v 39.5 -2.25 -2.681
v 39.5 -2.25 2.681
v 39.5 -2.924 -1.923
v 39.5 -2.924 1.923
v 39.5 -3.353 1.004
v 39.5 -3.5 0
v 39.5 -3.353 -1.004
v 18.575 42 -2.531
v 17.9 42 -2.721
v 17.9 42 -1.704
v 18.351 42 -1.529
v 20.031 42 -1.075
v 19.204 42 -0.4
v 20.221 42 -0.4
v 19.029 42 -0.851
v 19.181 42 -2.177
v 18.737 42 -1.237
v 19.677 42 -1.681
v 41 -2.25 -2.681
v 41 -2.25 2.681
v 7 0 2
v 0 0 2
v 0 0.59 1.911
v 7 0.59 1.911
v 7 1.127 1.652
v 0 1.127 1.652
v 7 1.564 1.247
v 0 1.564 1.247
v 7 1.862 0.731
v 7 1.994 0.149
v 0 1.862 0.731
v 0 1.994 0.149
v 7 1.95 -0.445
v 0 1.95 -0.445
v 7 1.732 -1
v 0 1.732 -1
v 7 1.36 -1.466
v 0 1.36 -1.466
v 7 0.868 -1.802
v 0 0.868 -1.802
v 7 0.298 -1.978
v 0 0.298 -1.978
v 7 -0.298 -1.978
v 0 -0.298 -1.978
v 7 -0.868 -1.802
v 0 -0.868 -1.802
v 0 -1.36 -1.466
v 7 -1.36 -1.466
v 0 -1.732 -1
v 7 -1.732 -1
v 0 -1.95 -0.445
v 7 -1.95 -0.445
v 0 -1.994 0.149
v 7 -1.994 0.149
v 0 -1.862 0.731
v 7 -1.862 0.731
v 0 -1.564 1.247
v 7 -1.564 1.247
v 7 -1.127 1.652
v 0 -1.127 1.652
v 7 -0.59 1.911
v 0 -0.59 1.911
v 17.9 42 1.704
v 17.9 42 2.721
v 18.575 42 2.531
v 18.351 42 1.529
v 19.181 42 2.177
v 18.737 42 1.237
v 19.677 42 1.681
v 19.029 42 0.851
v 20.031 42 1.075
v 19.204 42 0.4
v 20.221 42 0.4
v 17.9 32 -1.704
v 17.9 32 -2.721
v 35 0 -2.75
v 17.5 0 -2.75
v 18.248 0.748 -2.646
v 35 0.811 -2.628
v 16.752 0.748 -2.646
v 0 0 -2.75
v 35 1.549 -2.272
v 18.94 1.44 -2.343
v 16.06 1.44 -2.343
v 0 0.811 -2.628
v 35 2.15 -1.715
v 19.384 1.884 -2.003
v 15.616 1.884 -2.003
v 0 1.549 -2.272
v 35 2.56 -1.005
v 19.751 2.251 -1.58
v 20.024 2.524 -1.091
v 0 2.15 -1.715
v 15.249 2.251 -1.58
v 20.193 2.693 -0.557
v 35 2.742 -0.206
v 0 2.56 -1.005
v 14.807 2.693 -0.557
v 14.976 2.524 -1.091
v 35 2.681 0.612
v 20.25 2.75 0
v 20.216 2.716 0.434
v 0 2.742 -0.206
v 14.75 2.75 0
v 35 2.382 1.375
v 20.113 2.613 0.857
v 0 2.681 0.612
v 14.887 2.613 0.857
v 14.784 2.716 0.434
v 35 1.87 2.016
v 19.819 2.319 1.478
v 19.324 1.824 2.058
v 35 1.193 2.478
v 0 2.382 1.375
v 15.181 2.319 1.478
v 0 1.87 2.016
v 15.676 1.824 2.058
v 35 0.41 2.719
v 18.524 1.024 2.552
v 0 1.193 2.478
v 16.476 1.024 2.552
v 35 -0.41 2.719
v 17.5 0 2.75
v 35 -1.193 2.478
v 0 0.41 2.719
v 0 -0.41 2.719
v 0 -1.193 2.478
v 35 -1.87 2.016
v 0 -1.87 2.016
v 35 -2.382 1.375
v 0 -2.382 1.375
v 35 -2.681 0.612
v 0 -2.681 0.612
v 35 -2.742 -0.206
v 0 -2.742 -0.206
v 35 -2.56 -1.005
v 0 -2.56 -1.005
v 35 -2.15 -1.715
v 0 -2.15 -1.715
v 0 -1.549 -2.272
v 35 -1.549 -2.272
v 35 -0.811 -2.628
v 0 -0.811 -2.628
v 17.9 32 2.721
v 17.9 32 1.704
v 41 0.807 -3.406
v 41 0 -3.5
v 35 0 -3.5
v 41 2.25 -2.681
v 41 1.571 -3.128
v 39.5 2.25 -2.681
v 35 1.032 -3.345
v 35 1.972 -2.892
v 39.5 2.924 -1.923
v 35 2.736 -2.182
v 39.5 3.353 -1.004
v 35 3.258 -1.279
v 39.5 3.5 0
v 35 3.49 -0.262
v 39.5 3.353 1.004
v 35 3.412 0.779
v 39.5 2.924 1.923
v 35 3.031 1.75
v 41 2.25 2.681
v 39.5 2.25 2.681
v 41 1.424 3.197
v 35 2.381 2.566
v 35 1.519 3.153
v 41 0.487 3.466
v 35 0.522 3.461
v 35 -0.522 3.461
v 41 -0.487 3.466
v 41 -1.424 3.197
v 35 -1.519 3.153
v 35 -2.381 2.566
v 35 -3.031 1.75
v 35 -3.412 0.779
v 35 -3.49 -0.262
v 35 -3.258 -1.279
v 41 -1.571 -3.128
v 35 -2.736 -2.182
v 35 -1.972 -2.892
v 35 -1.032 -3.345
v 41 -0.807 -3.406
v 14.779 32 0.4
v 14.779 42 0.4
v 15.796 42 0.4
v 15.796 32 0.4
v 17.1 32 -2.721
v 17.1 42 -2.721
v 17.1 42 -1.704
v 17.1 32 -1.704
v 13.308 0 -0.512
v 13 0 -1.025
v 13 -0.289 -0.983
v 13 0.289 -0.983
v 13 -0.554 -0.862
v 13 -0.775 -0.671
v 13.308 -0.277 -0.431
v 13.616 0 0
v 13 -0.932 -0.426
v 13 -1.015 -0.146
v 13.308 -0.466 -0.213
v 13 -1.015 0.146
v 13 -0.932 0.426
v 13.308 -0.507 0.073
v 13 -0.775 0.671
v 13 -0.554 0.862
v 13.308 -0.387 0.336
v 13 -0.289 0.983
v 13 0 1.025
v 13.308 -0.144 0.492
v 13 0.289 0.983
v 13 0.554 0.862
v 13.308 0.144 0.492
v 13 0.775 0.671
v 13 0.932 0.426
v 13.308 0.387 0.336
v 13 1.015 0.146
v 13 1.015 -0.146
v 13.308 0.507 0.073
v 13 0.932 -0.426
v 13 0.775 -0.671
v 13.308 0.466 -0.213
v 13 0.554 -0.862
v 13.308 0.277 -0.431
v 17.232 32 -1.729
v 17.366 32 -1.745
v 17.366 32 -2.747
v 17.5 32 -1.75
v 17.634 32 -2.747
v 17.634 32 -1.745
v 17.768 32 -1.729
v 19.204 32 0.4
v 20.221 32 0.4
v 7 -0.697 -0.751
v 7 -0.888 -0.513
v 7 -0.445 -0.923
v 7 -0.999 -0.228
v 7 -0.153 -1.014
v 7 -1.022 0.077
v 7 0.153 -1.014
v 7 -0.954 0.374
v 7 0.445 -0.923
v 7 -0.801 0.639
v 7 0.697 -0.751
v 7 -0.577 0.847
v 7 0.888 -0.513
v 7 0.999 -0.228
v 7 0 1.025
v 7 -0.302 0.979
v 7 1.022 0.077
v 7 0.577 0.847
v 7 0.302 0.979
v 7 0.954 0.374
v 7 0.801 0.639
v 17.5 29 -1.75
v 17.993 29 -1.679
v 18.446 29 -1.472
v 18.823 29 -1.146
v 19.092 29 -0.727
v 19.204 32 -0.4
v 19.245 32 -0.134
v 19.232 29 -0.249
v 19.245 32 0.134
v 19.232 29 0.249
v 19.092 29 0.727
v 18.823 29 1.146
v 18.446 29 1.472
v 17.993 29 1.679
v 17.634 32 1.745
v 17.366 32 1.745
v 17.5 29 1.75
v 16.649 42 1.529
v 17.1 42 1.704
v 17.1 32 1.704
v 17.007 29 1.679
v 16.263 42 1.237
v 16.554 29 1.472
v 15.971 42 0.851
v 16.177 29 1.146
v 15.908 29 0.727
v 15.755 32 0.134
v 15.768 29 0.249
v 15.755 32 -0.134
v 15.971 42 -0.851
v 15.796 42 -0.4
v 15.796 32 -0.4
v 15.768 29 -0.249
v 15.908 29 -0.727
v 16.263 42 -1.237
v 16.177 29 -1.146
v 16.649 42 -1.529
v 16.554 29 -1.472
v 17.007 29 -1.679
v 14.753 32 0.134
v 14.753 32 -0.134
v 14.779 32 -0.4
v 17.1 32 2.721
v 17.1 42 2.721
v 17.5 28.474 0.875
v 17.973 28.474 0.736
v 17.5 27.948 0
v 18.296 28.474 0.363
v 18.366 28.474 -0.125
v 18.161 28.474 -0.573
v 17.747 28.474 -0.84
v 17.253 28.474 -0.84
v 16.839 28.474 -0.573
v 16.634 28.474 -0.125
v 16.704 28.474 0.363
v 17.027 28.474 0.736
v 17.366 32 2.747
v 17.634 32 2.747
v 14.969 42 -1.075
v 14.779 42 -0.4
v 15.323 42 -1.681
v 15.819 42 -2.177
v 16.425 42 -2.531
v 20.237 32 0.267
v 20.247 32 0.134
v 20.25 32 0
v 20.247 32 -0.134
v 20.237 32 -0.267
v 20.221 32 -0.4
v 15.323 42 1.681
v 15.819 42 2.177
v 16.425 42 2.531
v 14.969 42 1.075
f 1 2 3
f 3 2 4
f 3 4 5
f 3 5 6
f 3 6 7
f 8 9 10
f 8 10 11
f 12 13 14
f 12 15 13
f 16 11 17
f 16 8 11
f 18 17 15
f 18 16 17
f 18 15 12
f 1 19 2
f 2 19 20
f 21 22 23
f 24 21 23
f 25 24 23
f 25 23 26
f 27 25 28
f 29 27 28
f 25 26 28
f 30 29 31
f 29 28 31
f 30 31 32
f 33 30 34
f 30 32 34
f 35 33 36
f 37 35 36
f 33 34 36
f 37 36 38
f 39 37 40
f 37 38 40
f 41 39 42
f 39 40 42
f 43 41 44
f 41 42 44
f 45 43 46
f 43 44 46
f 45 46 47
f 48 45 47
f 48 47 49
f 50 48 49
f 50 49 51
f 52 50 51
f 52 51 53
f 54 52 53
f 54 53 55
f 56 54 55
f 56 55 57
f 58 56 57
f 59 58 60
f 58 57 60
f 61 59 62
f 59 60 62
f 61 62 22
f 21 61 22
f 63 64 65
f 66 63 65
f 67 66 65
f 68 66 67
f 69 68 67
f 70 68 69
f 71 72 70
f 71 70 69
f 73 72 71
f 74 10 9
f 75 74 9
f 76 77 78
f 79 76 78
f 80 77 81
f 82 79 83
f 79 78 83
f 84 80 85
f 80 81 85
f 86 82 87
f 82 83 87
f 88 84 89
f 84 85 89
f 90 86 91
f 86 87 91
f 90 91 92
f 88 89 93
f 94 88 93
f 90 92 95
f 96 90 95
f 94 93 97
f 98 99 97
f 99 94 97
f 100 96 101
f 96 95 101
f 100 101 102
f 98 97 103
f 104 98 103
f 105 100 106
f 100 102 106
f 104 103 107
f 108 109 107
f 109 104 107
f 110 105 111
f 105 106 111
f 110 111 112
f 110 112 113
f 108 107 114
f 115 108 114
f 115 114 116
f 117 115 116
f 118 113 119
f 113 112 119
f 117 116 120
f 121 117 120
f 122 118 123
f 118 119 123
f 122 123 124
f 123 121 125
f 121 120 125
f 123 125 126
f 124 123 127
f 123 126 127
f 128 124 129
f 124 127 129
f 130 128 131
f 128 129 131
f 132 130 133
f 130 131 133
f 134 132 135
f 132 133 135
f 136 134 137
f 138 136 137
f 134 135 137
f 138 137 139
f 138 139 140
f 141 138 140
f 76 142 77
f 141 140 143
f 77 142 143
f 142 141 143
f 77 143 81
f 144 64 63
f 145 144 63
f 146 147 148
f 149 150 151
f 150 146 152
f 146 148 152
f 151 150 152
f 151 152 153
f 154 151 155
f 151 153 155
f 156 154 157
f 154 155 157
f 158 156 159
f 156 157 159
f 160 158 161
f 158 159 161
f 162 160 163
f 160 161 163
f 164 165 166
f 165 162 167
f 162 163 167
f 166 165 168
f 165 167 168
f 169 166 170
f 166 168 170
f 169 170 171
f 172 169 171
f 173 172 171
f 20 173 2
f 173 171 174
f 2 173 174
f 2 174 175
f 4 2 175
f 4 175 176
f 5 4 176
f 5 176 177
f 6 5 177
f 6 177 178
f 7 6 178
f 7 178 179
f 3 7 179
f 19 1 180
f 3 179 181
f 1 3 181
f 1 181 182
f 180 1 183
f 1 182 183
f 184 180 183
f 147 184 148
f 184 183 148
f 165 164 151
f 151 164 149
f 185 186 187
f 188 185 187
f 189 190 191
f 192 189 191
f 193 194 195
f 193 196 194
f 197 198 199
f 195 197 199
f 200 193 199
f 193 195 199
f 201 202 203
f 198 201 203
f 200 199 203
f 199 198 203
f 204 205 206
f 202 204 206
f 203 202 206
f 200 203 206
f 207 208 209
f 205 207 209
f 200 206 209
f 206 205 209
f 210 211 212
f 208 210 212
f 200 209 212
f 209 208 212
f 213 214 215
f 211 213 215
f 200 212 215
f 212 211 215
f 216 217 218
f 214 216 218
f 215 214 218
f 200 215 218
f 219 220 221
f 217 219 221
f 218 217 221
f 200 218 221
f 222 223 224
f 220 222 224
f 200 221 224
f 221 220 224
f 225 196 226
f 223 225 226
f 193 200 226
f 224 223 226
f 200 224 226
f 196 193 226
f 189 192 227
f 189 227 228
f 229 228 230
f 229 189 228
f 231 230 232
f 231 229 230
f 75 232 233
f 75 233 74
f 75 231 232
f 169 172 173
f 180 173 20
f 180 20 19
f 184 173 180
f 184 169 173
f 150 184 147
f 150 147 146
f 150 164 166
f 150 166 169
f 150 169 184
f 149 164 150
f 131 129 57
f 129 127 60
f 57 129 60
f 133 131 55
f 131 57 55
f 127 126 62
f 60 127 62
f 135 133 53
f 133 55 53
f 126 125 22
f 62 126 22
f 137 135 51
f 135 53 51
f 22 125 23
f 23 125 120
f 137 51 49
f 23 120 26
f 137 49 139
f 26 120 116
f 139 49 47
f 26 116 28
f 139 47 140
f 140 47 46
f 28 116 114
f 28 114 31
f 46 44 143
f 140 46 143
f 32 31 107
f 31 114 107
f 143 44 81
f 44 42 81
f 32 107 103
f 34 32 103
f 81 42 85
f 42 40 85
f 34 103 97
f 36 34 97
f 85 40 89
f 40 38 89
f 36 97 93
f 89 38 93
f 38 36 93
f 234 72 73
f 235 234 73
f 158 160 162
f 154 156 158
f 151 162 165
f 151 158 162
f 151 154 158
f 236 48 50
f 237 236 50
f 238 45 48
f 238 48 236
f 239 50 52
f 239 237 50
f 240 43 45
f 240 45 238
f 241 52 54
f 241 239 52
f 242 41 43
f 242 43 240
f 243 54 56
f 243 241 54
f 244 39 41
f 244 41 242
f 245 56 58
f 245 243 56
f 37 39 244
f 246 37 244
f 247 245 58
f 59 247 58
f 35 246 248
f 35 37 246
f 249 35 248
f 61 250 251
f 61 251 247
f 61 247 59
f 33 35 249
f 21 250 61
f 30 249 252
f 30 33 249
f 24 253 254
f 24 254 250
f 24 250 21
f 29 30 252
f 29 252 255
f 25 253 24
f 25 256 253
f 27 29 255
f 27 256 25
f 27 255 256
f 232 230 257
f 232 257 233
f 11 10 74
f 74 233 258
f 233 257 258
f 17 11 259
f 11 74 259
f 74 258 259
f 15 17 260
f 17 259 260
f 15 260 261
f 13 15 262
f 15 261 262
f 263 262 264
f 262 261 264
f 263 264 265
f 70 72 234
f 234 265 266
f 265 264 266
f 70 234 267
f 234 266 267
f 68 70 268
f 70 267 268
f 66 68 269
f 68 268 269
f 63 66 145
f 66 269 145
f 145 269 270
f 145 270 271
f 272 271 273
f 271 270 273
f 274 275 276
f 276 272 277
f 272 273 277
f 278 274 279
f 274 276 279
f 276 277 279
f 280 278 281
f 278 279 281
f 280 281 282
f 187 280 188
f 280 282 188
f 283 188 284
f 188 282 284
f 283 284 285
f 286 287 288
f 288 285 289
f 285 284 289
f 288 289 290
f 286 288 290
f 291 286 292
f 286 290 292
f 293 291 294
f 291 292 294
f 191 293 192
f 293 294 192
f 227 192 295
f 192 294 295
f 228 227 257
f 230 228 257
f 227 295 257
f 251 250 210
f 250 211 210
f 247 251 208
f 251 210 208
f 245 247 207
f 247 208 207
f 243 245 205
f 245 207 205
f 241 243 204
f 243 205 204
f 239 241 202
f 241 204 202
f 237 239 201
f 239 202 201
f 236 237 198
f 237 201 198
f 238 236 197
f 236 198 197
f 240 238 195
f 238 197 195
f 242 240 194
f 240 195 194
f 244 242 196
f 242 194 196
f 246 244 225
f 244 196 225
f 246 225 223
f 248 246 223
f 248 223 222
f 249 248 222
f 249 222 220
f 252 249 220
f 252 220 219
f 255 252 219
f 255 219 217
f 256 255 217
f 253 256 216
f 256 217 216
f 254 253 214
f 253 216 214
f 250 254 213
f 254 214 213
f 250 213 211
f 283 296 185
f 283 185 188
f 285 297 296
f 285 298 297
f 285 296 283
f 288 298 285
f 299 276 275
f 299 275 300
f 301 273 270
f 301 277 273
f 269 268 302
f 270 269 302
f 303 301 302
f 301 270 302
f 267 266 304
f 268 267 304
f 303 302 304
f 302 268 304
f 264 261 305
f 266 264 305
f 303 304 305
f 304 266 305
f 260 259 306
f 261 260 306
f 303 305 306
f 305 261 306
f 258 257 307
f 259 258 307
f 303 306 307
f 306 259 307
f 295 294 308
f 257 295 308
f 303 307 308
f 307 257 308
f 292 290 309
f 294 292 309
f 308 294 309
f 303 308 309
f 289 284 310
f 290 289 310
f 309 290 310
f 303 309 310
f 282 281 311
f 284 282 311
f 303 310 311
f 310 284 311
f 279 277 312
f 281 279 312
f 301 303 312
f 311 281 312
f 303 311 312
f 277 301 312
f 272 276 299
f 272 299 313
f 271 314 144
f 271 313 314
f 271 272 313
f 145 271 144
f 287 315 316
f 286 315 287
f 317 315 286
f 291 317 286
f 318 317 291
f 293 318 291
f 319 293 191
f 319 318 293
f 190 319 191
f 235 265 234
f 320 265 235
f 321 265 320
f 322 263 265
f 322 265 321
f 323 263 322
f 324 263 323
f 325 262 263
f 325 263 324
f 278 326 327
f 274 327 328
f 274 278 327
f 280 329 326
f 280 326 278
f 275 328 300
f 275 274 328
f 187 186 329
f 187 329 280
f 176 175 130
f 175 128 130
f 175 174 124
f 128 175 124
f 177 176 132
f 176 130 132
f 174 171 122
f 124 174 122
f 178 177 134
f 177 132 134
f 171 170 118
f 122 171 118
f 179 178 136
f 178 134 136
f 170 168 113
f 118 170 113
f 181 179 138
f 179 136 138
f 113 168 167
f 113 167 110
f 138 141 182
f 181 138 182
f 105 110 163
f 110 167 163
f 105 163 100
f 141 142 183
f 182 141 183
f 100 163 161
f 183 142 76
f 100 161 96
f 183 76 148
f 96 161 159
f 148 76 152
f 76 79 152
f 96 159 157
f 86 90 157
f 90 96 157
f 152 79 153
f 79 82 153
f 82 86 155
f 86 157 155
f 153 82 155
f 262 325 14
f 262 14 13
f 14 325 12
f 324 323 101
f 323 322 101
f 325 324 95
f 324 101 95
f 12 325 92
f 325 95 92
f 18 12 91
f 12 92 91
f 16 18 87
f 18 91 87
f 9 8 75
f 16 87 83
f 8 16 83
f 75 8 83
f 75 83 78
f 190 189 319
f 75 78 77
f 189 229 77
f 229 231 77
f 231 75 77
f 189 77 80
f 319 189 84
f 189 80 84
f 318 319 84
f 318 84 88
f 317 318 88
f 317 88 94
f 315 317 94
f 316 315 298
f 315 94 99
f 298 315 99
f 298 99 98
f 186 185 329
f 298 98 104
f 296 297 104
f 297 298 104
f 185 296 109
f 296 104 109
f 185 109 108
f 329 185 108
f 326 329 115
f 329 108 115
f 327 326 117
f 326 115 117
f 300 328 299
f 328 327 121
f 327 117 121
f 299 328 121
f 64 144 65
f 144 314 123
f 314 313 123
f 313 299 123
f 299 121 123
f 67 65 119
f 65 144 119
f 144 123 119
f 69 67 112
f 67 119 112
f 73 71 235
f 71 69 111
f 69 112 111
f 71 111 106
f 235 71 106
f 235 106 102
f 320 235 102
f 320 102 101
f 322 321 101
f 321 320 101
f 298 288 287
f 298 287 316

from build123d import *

# Parameters (mm, degrees)
SKETCH_1_R                  = 2.75
EXTRUDE_1_DEPTH             = 35
SKETCH_2_R                  = 2.75
EXTRUDE_2_DEPTH             = 42
HOLE_WIZARD_3_5_3_5_1_D     = 3.5
HOLE_WIZARD_3_5_3_5_1_DEPTH = 13
HOLE_WIZARD_3_5_3_5_1_TIP   = 1.051506083
SKETCH_4_W                  = 0.8
SKETCH_4_H                  = 0.8
CUT_EXTRUDE_1_DEPTH         = 10
SKETCH_5_R                  = 3.5
EXTRUDE_3_DEPTH             = 6
CUT_EXTRUDE_2_DEPTH         = 1.5
SKETCH_7_R                  = 2
CUT_EXTRUDE_3_DEPTH         = 7
M2_5X0_451_D                = 2.05
M2_5X0_451_DEPTH            = 6
M2_5X0_451_TIP              = 0.615882135


with BuildPart() as part:
    # Эскиз1 → Бобышка-Вытянуть1 (new body)
    with BuildSketch(Plane(origin=(0, 0, 0), x_dir=(0, 0, -1), z_dir=(1, 0, 0))):
        Circle(SKETCH_1_R)
    extrude(amount=EXTRUDE_1_DEPTH)

    # Эскиз2 → Бобышка-Вытянуть2 (add)
    with BuildSketch(Plane(origin=(0, 0, 0), x_dir=(1, 0, 0), z_dir=(0, 1, 0))):
        with Locations((17.5, 0)):
            Circle(SKETCH_2_R)
    extrude(amount=EXTRUDE_2_DEPTH)

    # Диаметр отверстия Ø3.5 (3.5)1
    with Locations(Plane(origin=(17.5, 42, 0), x_dir=(0, 0, 1), z_dir=(0, 1, 0))):
        with Locations((0, 0)):
            Hole(HOLE_WIZARD_3_5_3_5_1_D / 2, depth=HOLE_WIZARD_3_5_3_5_1_DEPTH)
            with Locations((0, 0, -(HOLE_WIZARD_3_5_3_5_1_DEPTH + HOLE_WIZARD_3_5_3_5_1_TIP / 2))):  # 118° drill point
                Cone(0, HOLE_WIZARD_3_5_3_5_1_D / 2, HOLE_WIZARD_3_5_3_5_1_TIP, mode=Mode.SUBTRACT)

    # Эскиз4 → Вырез-Вытянуть1 (cut)
    with BuildSketch(Plane(origin=(0, 42, 0), x_dir=(1, 0, 0), z_dir=(0, 1, 0))):
        with BuildLine():
            Line((17.1, 4), (17.1, 2.720753572))
            ThreePointArc((17.1, 2.720753572), (17.5, 2.75), (17.9, 2.720753572))
            Line((17.9, 2.720753572), (17.9, 4))
            Line((17.9, 4), (17.1, 4))
        make_face()
        with BuildLine():
            Line((17.1, -1.703672504), (17.1, -2.720753572))
            ThreePointArc((17.1, -2.720753572), (17.5, -2.75), (17.9, -2.720753572))
            Line((17.9, -2.720753572), (17.9, -1.703672504))
            ThreePointArc((17.9, -1.703672504), (17.5, -1.75), (17.1, -1.703672504))
        make_face()
        with BuildLine():
            ThreePointArc((17.9, 2.720753572), (17.5, 2.75), (17.1, 2.720753572))
            Line((17.1, 2.720753572), (17.1, 1.703672504))
            ThreePointArc((17.1, 1.703672504), (17.5, 1.75), (17.9, 1.703672504))
            Line((17.9, 1.703672504), (17.9, 2.720753572))
        make_face()
        with BuildLine():
            Line((17.1, 1.703672504), (17.1, 0.4))
            Line((17.1, 0.4), (17.9, 0.4))
            Line((17.9, 0.4), (17.9, 1.703672504))
            ThreePointArc((17.9, 1.703672504), (17.5, 1.75), (17.1, 1.703672504))
        make_face()
        with Locations((17.5, 0)):
            Rectangle(SKETCH_4_W, SKETCH_4_H)
        with BuildLine():
            Line((15.796327496, -0.4), (17.1, -0.4))
            Line((17.1, -0.4), (17.1, 0.4))
            Line((17.1, 0.4), (15.796327496, 0.4))
            ThreePointArc((15.796327496, 0.4), (15.75, 0), (15.796327496, -0.4))
        make_face()
        with BuildLine():
            ThreePointArc((14.779246428, 0.4), (14.75, 0), (14.779246428, -0.4))
            Line((14.779246428, -0.4), (15.796327496, -0.4))
            ThreePointArc((15.796327496, -0.4), (15.75, 0), (15.796327496, 0.4))
            Line((15.796327496, 0.4), (14.779246428, 0.4))
        make_face()
        with BuildLine():
            Line((19.203672504, -0.4), (20.220753572, -0.4))
            ThreePointArc((20.220753572, -0.4), (20.242678647, -0.200533883), (20.25, 0))
            ThreePointArc((20.25, 0), (20.242678647, 0.200533883), (20.220753572, 0.4))
            Line((20.220753572, 0.4), (19.203672504, 0.4))
            ThreePointArc((19.203672504, 0.4), (19.238379545, 0.20133693), (19.25, 0))
            ThreePointArc((19.25, 0), (19.238379545, -0.20133693), (19.203672504, -0.4))
        make_face()
        with BuildLine():
            Line((13.5, -0.4), (14.779246428, -0.4))
            ThreePointArc((14.779246428, -0.4), (14.75, 0), (14.779246428, 0.4))
            Line((14.779246428, 0.4), (13.5, 0.4))
            Line((13.5, 0.4), (13.5, -0.4))
        make_face()
        with BuildLine():
            Line((17.1, -0.4), (17.1, -1.703672504))
            ThreePointArc((17.1, -1.703672504), (17.5, -1.75), (17.9, -1.703672504))
            Line((17.9, -1.703672504), (17.9, -0.4))
            Line((17.9, -0.4), (17.1, -0.4))
        make_face()
        with BuildLine():
            Line((17.1, -2.720753572), (17.1, -4))
            Line((17.1, -4), (17.9, -4))
            Line((17.9, -4), (17.9, -2.720753572))
            ThreePointArc((17.9, -2.720753572), (17.5, -2.75), (17.1, -2.720753572))
        make_face()
        with BuildLine():
            Line((17.9, 0.4), (17.9, -0.4))
            Line((17.9, -0.4), (19.203672504, -0.4))
            ThreePointArc((19.203672504, -0.4), (19.238379545, -0.20133693), (19.25, 0))
            ThreePointArc((19.25, 0), (19.238379545, 0.20133693), (19.203672504, 0.4))
            Line((19.203672504, 0.4), (17.9, 0.4))
        make_face()
        with BuildLine():
            ThreePointArc((20.25, 0), (20.242678647, -0.200533883), (20.220753572, -0.4))
            Line((20.220753572, -0.4), (21.5, -0.4))
            Line((21.5, -0.4), (21.5, 0.4))
            Line((21.5, 0.4), (20.220753572, 0.4))
            ThreePointArc((20.220753572, 0.4), (20.242678647, 0.200533883), (20.25, 0))
        make_face()
    extrude(amount=-CUT_EXTRUDE_1_DEPTH, mode=Mode.SUBTRACT)

    # Эскиз5 → Бобышка-Вытянуть3 (add)
    with BuildSketch(Plane(origin=(35, 0, 0), x_dir=(0, 0, -1), z_dir=(1, 0, 0))):
        Circle(SKETCH_5_R)
    extrude(amount=EXTRUDE_3_DEPTH)

    # Эскиз6 → Вырез-Вытянуть2 (cut)
    with BuildSketch(Plane(origin=(41, 0, 0), x_dir=(0, 0, -1), z_dir=(1, 0, 0))):
        with BuildLine():
            ThreePointArc((2.680951324, 2.25), (0, 3.5), (-2.680951324, 2.25))
            Line((-2.680951324, 2.25), (2.680951324, 2.25))
        make_face()
        with BuildLine():
            Line((2.680951324, -2.25), (-2.680951324, -2.25))
            ThreePointArc((-2.680951324, -2.25), (0, -3.5), (2.680951324, -2.25))
        make_face()
    extrude(amount=-CUT_EXTRUDE_2_DEPTH, mode=Mode.SUBTRACT)

    # Эскиз7 → Вырез-Вытянуть3 (cut)
    with BuildSketch(Plane.ZY):
        Circle(SKETCH_7_R)
    extrude(amount=-CUT_EXTRUDE_3_DEPTH, mode=Mode.SUBTRACT)

    # Отверстие обработанное метчиком M2.5x0.451
    with Locations(Plane(origin=(7, 0, 0), x_dir=(0, 0, -1), z_dir=(-1, 0, 0))):
        with Locations((0, 0)):
            Hole(M2_5X0_451_D / 2, depth=M2_5X0_451_DEPTH)
            with Locations((0, 0, -(M2_5X0_451_DEPTH + M2_5X0_451_TIP / 2))):  # 118° drill point
                Cone(0, M2_5X0_451_D / 2, M2_5X0_451_TIP, mode=Mode.SUBTRACT)


solid = part.part
